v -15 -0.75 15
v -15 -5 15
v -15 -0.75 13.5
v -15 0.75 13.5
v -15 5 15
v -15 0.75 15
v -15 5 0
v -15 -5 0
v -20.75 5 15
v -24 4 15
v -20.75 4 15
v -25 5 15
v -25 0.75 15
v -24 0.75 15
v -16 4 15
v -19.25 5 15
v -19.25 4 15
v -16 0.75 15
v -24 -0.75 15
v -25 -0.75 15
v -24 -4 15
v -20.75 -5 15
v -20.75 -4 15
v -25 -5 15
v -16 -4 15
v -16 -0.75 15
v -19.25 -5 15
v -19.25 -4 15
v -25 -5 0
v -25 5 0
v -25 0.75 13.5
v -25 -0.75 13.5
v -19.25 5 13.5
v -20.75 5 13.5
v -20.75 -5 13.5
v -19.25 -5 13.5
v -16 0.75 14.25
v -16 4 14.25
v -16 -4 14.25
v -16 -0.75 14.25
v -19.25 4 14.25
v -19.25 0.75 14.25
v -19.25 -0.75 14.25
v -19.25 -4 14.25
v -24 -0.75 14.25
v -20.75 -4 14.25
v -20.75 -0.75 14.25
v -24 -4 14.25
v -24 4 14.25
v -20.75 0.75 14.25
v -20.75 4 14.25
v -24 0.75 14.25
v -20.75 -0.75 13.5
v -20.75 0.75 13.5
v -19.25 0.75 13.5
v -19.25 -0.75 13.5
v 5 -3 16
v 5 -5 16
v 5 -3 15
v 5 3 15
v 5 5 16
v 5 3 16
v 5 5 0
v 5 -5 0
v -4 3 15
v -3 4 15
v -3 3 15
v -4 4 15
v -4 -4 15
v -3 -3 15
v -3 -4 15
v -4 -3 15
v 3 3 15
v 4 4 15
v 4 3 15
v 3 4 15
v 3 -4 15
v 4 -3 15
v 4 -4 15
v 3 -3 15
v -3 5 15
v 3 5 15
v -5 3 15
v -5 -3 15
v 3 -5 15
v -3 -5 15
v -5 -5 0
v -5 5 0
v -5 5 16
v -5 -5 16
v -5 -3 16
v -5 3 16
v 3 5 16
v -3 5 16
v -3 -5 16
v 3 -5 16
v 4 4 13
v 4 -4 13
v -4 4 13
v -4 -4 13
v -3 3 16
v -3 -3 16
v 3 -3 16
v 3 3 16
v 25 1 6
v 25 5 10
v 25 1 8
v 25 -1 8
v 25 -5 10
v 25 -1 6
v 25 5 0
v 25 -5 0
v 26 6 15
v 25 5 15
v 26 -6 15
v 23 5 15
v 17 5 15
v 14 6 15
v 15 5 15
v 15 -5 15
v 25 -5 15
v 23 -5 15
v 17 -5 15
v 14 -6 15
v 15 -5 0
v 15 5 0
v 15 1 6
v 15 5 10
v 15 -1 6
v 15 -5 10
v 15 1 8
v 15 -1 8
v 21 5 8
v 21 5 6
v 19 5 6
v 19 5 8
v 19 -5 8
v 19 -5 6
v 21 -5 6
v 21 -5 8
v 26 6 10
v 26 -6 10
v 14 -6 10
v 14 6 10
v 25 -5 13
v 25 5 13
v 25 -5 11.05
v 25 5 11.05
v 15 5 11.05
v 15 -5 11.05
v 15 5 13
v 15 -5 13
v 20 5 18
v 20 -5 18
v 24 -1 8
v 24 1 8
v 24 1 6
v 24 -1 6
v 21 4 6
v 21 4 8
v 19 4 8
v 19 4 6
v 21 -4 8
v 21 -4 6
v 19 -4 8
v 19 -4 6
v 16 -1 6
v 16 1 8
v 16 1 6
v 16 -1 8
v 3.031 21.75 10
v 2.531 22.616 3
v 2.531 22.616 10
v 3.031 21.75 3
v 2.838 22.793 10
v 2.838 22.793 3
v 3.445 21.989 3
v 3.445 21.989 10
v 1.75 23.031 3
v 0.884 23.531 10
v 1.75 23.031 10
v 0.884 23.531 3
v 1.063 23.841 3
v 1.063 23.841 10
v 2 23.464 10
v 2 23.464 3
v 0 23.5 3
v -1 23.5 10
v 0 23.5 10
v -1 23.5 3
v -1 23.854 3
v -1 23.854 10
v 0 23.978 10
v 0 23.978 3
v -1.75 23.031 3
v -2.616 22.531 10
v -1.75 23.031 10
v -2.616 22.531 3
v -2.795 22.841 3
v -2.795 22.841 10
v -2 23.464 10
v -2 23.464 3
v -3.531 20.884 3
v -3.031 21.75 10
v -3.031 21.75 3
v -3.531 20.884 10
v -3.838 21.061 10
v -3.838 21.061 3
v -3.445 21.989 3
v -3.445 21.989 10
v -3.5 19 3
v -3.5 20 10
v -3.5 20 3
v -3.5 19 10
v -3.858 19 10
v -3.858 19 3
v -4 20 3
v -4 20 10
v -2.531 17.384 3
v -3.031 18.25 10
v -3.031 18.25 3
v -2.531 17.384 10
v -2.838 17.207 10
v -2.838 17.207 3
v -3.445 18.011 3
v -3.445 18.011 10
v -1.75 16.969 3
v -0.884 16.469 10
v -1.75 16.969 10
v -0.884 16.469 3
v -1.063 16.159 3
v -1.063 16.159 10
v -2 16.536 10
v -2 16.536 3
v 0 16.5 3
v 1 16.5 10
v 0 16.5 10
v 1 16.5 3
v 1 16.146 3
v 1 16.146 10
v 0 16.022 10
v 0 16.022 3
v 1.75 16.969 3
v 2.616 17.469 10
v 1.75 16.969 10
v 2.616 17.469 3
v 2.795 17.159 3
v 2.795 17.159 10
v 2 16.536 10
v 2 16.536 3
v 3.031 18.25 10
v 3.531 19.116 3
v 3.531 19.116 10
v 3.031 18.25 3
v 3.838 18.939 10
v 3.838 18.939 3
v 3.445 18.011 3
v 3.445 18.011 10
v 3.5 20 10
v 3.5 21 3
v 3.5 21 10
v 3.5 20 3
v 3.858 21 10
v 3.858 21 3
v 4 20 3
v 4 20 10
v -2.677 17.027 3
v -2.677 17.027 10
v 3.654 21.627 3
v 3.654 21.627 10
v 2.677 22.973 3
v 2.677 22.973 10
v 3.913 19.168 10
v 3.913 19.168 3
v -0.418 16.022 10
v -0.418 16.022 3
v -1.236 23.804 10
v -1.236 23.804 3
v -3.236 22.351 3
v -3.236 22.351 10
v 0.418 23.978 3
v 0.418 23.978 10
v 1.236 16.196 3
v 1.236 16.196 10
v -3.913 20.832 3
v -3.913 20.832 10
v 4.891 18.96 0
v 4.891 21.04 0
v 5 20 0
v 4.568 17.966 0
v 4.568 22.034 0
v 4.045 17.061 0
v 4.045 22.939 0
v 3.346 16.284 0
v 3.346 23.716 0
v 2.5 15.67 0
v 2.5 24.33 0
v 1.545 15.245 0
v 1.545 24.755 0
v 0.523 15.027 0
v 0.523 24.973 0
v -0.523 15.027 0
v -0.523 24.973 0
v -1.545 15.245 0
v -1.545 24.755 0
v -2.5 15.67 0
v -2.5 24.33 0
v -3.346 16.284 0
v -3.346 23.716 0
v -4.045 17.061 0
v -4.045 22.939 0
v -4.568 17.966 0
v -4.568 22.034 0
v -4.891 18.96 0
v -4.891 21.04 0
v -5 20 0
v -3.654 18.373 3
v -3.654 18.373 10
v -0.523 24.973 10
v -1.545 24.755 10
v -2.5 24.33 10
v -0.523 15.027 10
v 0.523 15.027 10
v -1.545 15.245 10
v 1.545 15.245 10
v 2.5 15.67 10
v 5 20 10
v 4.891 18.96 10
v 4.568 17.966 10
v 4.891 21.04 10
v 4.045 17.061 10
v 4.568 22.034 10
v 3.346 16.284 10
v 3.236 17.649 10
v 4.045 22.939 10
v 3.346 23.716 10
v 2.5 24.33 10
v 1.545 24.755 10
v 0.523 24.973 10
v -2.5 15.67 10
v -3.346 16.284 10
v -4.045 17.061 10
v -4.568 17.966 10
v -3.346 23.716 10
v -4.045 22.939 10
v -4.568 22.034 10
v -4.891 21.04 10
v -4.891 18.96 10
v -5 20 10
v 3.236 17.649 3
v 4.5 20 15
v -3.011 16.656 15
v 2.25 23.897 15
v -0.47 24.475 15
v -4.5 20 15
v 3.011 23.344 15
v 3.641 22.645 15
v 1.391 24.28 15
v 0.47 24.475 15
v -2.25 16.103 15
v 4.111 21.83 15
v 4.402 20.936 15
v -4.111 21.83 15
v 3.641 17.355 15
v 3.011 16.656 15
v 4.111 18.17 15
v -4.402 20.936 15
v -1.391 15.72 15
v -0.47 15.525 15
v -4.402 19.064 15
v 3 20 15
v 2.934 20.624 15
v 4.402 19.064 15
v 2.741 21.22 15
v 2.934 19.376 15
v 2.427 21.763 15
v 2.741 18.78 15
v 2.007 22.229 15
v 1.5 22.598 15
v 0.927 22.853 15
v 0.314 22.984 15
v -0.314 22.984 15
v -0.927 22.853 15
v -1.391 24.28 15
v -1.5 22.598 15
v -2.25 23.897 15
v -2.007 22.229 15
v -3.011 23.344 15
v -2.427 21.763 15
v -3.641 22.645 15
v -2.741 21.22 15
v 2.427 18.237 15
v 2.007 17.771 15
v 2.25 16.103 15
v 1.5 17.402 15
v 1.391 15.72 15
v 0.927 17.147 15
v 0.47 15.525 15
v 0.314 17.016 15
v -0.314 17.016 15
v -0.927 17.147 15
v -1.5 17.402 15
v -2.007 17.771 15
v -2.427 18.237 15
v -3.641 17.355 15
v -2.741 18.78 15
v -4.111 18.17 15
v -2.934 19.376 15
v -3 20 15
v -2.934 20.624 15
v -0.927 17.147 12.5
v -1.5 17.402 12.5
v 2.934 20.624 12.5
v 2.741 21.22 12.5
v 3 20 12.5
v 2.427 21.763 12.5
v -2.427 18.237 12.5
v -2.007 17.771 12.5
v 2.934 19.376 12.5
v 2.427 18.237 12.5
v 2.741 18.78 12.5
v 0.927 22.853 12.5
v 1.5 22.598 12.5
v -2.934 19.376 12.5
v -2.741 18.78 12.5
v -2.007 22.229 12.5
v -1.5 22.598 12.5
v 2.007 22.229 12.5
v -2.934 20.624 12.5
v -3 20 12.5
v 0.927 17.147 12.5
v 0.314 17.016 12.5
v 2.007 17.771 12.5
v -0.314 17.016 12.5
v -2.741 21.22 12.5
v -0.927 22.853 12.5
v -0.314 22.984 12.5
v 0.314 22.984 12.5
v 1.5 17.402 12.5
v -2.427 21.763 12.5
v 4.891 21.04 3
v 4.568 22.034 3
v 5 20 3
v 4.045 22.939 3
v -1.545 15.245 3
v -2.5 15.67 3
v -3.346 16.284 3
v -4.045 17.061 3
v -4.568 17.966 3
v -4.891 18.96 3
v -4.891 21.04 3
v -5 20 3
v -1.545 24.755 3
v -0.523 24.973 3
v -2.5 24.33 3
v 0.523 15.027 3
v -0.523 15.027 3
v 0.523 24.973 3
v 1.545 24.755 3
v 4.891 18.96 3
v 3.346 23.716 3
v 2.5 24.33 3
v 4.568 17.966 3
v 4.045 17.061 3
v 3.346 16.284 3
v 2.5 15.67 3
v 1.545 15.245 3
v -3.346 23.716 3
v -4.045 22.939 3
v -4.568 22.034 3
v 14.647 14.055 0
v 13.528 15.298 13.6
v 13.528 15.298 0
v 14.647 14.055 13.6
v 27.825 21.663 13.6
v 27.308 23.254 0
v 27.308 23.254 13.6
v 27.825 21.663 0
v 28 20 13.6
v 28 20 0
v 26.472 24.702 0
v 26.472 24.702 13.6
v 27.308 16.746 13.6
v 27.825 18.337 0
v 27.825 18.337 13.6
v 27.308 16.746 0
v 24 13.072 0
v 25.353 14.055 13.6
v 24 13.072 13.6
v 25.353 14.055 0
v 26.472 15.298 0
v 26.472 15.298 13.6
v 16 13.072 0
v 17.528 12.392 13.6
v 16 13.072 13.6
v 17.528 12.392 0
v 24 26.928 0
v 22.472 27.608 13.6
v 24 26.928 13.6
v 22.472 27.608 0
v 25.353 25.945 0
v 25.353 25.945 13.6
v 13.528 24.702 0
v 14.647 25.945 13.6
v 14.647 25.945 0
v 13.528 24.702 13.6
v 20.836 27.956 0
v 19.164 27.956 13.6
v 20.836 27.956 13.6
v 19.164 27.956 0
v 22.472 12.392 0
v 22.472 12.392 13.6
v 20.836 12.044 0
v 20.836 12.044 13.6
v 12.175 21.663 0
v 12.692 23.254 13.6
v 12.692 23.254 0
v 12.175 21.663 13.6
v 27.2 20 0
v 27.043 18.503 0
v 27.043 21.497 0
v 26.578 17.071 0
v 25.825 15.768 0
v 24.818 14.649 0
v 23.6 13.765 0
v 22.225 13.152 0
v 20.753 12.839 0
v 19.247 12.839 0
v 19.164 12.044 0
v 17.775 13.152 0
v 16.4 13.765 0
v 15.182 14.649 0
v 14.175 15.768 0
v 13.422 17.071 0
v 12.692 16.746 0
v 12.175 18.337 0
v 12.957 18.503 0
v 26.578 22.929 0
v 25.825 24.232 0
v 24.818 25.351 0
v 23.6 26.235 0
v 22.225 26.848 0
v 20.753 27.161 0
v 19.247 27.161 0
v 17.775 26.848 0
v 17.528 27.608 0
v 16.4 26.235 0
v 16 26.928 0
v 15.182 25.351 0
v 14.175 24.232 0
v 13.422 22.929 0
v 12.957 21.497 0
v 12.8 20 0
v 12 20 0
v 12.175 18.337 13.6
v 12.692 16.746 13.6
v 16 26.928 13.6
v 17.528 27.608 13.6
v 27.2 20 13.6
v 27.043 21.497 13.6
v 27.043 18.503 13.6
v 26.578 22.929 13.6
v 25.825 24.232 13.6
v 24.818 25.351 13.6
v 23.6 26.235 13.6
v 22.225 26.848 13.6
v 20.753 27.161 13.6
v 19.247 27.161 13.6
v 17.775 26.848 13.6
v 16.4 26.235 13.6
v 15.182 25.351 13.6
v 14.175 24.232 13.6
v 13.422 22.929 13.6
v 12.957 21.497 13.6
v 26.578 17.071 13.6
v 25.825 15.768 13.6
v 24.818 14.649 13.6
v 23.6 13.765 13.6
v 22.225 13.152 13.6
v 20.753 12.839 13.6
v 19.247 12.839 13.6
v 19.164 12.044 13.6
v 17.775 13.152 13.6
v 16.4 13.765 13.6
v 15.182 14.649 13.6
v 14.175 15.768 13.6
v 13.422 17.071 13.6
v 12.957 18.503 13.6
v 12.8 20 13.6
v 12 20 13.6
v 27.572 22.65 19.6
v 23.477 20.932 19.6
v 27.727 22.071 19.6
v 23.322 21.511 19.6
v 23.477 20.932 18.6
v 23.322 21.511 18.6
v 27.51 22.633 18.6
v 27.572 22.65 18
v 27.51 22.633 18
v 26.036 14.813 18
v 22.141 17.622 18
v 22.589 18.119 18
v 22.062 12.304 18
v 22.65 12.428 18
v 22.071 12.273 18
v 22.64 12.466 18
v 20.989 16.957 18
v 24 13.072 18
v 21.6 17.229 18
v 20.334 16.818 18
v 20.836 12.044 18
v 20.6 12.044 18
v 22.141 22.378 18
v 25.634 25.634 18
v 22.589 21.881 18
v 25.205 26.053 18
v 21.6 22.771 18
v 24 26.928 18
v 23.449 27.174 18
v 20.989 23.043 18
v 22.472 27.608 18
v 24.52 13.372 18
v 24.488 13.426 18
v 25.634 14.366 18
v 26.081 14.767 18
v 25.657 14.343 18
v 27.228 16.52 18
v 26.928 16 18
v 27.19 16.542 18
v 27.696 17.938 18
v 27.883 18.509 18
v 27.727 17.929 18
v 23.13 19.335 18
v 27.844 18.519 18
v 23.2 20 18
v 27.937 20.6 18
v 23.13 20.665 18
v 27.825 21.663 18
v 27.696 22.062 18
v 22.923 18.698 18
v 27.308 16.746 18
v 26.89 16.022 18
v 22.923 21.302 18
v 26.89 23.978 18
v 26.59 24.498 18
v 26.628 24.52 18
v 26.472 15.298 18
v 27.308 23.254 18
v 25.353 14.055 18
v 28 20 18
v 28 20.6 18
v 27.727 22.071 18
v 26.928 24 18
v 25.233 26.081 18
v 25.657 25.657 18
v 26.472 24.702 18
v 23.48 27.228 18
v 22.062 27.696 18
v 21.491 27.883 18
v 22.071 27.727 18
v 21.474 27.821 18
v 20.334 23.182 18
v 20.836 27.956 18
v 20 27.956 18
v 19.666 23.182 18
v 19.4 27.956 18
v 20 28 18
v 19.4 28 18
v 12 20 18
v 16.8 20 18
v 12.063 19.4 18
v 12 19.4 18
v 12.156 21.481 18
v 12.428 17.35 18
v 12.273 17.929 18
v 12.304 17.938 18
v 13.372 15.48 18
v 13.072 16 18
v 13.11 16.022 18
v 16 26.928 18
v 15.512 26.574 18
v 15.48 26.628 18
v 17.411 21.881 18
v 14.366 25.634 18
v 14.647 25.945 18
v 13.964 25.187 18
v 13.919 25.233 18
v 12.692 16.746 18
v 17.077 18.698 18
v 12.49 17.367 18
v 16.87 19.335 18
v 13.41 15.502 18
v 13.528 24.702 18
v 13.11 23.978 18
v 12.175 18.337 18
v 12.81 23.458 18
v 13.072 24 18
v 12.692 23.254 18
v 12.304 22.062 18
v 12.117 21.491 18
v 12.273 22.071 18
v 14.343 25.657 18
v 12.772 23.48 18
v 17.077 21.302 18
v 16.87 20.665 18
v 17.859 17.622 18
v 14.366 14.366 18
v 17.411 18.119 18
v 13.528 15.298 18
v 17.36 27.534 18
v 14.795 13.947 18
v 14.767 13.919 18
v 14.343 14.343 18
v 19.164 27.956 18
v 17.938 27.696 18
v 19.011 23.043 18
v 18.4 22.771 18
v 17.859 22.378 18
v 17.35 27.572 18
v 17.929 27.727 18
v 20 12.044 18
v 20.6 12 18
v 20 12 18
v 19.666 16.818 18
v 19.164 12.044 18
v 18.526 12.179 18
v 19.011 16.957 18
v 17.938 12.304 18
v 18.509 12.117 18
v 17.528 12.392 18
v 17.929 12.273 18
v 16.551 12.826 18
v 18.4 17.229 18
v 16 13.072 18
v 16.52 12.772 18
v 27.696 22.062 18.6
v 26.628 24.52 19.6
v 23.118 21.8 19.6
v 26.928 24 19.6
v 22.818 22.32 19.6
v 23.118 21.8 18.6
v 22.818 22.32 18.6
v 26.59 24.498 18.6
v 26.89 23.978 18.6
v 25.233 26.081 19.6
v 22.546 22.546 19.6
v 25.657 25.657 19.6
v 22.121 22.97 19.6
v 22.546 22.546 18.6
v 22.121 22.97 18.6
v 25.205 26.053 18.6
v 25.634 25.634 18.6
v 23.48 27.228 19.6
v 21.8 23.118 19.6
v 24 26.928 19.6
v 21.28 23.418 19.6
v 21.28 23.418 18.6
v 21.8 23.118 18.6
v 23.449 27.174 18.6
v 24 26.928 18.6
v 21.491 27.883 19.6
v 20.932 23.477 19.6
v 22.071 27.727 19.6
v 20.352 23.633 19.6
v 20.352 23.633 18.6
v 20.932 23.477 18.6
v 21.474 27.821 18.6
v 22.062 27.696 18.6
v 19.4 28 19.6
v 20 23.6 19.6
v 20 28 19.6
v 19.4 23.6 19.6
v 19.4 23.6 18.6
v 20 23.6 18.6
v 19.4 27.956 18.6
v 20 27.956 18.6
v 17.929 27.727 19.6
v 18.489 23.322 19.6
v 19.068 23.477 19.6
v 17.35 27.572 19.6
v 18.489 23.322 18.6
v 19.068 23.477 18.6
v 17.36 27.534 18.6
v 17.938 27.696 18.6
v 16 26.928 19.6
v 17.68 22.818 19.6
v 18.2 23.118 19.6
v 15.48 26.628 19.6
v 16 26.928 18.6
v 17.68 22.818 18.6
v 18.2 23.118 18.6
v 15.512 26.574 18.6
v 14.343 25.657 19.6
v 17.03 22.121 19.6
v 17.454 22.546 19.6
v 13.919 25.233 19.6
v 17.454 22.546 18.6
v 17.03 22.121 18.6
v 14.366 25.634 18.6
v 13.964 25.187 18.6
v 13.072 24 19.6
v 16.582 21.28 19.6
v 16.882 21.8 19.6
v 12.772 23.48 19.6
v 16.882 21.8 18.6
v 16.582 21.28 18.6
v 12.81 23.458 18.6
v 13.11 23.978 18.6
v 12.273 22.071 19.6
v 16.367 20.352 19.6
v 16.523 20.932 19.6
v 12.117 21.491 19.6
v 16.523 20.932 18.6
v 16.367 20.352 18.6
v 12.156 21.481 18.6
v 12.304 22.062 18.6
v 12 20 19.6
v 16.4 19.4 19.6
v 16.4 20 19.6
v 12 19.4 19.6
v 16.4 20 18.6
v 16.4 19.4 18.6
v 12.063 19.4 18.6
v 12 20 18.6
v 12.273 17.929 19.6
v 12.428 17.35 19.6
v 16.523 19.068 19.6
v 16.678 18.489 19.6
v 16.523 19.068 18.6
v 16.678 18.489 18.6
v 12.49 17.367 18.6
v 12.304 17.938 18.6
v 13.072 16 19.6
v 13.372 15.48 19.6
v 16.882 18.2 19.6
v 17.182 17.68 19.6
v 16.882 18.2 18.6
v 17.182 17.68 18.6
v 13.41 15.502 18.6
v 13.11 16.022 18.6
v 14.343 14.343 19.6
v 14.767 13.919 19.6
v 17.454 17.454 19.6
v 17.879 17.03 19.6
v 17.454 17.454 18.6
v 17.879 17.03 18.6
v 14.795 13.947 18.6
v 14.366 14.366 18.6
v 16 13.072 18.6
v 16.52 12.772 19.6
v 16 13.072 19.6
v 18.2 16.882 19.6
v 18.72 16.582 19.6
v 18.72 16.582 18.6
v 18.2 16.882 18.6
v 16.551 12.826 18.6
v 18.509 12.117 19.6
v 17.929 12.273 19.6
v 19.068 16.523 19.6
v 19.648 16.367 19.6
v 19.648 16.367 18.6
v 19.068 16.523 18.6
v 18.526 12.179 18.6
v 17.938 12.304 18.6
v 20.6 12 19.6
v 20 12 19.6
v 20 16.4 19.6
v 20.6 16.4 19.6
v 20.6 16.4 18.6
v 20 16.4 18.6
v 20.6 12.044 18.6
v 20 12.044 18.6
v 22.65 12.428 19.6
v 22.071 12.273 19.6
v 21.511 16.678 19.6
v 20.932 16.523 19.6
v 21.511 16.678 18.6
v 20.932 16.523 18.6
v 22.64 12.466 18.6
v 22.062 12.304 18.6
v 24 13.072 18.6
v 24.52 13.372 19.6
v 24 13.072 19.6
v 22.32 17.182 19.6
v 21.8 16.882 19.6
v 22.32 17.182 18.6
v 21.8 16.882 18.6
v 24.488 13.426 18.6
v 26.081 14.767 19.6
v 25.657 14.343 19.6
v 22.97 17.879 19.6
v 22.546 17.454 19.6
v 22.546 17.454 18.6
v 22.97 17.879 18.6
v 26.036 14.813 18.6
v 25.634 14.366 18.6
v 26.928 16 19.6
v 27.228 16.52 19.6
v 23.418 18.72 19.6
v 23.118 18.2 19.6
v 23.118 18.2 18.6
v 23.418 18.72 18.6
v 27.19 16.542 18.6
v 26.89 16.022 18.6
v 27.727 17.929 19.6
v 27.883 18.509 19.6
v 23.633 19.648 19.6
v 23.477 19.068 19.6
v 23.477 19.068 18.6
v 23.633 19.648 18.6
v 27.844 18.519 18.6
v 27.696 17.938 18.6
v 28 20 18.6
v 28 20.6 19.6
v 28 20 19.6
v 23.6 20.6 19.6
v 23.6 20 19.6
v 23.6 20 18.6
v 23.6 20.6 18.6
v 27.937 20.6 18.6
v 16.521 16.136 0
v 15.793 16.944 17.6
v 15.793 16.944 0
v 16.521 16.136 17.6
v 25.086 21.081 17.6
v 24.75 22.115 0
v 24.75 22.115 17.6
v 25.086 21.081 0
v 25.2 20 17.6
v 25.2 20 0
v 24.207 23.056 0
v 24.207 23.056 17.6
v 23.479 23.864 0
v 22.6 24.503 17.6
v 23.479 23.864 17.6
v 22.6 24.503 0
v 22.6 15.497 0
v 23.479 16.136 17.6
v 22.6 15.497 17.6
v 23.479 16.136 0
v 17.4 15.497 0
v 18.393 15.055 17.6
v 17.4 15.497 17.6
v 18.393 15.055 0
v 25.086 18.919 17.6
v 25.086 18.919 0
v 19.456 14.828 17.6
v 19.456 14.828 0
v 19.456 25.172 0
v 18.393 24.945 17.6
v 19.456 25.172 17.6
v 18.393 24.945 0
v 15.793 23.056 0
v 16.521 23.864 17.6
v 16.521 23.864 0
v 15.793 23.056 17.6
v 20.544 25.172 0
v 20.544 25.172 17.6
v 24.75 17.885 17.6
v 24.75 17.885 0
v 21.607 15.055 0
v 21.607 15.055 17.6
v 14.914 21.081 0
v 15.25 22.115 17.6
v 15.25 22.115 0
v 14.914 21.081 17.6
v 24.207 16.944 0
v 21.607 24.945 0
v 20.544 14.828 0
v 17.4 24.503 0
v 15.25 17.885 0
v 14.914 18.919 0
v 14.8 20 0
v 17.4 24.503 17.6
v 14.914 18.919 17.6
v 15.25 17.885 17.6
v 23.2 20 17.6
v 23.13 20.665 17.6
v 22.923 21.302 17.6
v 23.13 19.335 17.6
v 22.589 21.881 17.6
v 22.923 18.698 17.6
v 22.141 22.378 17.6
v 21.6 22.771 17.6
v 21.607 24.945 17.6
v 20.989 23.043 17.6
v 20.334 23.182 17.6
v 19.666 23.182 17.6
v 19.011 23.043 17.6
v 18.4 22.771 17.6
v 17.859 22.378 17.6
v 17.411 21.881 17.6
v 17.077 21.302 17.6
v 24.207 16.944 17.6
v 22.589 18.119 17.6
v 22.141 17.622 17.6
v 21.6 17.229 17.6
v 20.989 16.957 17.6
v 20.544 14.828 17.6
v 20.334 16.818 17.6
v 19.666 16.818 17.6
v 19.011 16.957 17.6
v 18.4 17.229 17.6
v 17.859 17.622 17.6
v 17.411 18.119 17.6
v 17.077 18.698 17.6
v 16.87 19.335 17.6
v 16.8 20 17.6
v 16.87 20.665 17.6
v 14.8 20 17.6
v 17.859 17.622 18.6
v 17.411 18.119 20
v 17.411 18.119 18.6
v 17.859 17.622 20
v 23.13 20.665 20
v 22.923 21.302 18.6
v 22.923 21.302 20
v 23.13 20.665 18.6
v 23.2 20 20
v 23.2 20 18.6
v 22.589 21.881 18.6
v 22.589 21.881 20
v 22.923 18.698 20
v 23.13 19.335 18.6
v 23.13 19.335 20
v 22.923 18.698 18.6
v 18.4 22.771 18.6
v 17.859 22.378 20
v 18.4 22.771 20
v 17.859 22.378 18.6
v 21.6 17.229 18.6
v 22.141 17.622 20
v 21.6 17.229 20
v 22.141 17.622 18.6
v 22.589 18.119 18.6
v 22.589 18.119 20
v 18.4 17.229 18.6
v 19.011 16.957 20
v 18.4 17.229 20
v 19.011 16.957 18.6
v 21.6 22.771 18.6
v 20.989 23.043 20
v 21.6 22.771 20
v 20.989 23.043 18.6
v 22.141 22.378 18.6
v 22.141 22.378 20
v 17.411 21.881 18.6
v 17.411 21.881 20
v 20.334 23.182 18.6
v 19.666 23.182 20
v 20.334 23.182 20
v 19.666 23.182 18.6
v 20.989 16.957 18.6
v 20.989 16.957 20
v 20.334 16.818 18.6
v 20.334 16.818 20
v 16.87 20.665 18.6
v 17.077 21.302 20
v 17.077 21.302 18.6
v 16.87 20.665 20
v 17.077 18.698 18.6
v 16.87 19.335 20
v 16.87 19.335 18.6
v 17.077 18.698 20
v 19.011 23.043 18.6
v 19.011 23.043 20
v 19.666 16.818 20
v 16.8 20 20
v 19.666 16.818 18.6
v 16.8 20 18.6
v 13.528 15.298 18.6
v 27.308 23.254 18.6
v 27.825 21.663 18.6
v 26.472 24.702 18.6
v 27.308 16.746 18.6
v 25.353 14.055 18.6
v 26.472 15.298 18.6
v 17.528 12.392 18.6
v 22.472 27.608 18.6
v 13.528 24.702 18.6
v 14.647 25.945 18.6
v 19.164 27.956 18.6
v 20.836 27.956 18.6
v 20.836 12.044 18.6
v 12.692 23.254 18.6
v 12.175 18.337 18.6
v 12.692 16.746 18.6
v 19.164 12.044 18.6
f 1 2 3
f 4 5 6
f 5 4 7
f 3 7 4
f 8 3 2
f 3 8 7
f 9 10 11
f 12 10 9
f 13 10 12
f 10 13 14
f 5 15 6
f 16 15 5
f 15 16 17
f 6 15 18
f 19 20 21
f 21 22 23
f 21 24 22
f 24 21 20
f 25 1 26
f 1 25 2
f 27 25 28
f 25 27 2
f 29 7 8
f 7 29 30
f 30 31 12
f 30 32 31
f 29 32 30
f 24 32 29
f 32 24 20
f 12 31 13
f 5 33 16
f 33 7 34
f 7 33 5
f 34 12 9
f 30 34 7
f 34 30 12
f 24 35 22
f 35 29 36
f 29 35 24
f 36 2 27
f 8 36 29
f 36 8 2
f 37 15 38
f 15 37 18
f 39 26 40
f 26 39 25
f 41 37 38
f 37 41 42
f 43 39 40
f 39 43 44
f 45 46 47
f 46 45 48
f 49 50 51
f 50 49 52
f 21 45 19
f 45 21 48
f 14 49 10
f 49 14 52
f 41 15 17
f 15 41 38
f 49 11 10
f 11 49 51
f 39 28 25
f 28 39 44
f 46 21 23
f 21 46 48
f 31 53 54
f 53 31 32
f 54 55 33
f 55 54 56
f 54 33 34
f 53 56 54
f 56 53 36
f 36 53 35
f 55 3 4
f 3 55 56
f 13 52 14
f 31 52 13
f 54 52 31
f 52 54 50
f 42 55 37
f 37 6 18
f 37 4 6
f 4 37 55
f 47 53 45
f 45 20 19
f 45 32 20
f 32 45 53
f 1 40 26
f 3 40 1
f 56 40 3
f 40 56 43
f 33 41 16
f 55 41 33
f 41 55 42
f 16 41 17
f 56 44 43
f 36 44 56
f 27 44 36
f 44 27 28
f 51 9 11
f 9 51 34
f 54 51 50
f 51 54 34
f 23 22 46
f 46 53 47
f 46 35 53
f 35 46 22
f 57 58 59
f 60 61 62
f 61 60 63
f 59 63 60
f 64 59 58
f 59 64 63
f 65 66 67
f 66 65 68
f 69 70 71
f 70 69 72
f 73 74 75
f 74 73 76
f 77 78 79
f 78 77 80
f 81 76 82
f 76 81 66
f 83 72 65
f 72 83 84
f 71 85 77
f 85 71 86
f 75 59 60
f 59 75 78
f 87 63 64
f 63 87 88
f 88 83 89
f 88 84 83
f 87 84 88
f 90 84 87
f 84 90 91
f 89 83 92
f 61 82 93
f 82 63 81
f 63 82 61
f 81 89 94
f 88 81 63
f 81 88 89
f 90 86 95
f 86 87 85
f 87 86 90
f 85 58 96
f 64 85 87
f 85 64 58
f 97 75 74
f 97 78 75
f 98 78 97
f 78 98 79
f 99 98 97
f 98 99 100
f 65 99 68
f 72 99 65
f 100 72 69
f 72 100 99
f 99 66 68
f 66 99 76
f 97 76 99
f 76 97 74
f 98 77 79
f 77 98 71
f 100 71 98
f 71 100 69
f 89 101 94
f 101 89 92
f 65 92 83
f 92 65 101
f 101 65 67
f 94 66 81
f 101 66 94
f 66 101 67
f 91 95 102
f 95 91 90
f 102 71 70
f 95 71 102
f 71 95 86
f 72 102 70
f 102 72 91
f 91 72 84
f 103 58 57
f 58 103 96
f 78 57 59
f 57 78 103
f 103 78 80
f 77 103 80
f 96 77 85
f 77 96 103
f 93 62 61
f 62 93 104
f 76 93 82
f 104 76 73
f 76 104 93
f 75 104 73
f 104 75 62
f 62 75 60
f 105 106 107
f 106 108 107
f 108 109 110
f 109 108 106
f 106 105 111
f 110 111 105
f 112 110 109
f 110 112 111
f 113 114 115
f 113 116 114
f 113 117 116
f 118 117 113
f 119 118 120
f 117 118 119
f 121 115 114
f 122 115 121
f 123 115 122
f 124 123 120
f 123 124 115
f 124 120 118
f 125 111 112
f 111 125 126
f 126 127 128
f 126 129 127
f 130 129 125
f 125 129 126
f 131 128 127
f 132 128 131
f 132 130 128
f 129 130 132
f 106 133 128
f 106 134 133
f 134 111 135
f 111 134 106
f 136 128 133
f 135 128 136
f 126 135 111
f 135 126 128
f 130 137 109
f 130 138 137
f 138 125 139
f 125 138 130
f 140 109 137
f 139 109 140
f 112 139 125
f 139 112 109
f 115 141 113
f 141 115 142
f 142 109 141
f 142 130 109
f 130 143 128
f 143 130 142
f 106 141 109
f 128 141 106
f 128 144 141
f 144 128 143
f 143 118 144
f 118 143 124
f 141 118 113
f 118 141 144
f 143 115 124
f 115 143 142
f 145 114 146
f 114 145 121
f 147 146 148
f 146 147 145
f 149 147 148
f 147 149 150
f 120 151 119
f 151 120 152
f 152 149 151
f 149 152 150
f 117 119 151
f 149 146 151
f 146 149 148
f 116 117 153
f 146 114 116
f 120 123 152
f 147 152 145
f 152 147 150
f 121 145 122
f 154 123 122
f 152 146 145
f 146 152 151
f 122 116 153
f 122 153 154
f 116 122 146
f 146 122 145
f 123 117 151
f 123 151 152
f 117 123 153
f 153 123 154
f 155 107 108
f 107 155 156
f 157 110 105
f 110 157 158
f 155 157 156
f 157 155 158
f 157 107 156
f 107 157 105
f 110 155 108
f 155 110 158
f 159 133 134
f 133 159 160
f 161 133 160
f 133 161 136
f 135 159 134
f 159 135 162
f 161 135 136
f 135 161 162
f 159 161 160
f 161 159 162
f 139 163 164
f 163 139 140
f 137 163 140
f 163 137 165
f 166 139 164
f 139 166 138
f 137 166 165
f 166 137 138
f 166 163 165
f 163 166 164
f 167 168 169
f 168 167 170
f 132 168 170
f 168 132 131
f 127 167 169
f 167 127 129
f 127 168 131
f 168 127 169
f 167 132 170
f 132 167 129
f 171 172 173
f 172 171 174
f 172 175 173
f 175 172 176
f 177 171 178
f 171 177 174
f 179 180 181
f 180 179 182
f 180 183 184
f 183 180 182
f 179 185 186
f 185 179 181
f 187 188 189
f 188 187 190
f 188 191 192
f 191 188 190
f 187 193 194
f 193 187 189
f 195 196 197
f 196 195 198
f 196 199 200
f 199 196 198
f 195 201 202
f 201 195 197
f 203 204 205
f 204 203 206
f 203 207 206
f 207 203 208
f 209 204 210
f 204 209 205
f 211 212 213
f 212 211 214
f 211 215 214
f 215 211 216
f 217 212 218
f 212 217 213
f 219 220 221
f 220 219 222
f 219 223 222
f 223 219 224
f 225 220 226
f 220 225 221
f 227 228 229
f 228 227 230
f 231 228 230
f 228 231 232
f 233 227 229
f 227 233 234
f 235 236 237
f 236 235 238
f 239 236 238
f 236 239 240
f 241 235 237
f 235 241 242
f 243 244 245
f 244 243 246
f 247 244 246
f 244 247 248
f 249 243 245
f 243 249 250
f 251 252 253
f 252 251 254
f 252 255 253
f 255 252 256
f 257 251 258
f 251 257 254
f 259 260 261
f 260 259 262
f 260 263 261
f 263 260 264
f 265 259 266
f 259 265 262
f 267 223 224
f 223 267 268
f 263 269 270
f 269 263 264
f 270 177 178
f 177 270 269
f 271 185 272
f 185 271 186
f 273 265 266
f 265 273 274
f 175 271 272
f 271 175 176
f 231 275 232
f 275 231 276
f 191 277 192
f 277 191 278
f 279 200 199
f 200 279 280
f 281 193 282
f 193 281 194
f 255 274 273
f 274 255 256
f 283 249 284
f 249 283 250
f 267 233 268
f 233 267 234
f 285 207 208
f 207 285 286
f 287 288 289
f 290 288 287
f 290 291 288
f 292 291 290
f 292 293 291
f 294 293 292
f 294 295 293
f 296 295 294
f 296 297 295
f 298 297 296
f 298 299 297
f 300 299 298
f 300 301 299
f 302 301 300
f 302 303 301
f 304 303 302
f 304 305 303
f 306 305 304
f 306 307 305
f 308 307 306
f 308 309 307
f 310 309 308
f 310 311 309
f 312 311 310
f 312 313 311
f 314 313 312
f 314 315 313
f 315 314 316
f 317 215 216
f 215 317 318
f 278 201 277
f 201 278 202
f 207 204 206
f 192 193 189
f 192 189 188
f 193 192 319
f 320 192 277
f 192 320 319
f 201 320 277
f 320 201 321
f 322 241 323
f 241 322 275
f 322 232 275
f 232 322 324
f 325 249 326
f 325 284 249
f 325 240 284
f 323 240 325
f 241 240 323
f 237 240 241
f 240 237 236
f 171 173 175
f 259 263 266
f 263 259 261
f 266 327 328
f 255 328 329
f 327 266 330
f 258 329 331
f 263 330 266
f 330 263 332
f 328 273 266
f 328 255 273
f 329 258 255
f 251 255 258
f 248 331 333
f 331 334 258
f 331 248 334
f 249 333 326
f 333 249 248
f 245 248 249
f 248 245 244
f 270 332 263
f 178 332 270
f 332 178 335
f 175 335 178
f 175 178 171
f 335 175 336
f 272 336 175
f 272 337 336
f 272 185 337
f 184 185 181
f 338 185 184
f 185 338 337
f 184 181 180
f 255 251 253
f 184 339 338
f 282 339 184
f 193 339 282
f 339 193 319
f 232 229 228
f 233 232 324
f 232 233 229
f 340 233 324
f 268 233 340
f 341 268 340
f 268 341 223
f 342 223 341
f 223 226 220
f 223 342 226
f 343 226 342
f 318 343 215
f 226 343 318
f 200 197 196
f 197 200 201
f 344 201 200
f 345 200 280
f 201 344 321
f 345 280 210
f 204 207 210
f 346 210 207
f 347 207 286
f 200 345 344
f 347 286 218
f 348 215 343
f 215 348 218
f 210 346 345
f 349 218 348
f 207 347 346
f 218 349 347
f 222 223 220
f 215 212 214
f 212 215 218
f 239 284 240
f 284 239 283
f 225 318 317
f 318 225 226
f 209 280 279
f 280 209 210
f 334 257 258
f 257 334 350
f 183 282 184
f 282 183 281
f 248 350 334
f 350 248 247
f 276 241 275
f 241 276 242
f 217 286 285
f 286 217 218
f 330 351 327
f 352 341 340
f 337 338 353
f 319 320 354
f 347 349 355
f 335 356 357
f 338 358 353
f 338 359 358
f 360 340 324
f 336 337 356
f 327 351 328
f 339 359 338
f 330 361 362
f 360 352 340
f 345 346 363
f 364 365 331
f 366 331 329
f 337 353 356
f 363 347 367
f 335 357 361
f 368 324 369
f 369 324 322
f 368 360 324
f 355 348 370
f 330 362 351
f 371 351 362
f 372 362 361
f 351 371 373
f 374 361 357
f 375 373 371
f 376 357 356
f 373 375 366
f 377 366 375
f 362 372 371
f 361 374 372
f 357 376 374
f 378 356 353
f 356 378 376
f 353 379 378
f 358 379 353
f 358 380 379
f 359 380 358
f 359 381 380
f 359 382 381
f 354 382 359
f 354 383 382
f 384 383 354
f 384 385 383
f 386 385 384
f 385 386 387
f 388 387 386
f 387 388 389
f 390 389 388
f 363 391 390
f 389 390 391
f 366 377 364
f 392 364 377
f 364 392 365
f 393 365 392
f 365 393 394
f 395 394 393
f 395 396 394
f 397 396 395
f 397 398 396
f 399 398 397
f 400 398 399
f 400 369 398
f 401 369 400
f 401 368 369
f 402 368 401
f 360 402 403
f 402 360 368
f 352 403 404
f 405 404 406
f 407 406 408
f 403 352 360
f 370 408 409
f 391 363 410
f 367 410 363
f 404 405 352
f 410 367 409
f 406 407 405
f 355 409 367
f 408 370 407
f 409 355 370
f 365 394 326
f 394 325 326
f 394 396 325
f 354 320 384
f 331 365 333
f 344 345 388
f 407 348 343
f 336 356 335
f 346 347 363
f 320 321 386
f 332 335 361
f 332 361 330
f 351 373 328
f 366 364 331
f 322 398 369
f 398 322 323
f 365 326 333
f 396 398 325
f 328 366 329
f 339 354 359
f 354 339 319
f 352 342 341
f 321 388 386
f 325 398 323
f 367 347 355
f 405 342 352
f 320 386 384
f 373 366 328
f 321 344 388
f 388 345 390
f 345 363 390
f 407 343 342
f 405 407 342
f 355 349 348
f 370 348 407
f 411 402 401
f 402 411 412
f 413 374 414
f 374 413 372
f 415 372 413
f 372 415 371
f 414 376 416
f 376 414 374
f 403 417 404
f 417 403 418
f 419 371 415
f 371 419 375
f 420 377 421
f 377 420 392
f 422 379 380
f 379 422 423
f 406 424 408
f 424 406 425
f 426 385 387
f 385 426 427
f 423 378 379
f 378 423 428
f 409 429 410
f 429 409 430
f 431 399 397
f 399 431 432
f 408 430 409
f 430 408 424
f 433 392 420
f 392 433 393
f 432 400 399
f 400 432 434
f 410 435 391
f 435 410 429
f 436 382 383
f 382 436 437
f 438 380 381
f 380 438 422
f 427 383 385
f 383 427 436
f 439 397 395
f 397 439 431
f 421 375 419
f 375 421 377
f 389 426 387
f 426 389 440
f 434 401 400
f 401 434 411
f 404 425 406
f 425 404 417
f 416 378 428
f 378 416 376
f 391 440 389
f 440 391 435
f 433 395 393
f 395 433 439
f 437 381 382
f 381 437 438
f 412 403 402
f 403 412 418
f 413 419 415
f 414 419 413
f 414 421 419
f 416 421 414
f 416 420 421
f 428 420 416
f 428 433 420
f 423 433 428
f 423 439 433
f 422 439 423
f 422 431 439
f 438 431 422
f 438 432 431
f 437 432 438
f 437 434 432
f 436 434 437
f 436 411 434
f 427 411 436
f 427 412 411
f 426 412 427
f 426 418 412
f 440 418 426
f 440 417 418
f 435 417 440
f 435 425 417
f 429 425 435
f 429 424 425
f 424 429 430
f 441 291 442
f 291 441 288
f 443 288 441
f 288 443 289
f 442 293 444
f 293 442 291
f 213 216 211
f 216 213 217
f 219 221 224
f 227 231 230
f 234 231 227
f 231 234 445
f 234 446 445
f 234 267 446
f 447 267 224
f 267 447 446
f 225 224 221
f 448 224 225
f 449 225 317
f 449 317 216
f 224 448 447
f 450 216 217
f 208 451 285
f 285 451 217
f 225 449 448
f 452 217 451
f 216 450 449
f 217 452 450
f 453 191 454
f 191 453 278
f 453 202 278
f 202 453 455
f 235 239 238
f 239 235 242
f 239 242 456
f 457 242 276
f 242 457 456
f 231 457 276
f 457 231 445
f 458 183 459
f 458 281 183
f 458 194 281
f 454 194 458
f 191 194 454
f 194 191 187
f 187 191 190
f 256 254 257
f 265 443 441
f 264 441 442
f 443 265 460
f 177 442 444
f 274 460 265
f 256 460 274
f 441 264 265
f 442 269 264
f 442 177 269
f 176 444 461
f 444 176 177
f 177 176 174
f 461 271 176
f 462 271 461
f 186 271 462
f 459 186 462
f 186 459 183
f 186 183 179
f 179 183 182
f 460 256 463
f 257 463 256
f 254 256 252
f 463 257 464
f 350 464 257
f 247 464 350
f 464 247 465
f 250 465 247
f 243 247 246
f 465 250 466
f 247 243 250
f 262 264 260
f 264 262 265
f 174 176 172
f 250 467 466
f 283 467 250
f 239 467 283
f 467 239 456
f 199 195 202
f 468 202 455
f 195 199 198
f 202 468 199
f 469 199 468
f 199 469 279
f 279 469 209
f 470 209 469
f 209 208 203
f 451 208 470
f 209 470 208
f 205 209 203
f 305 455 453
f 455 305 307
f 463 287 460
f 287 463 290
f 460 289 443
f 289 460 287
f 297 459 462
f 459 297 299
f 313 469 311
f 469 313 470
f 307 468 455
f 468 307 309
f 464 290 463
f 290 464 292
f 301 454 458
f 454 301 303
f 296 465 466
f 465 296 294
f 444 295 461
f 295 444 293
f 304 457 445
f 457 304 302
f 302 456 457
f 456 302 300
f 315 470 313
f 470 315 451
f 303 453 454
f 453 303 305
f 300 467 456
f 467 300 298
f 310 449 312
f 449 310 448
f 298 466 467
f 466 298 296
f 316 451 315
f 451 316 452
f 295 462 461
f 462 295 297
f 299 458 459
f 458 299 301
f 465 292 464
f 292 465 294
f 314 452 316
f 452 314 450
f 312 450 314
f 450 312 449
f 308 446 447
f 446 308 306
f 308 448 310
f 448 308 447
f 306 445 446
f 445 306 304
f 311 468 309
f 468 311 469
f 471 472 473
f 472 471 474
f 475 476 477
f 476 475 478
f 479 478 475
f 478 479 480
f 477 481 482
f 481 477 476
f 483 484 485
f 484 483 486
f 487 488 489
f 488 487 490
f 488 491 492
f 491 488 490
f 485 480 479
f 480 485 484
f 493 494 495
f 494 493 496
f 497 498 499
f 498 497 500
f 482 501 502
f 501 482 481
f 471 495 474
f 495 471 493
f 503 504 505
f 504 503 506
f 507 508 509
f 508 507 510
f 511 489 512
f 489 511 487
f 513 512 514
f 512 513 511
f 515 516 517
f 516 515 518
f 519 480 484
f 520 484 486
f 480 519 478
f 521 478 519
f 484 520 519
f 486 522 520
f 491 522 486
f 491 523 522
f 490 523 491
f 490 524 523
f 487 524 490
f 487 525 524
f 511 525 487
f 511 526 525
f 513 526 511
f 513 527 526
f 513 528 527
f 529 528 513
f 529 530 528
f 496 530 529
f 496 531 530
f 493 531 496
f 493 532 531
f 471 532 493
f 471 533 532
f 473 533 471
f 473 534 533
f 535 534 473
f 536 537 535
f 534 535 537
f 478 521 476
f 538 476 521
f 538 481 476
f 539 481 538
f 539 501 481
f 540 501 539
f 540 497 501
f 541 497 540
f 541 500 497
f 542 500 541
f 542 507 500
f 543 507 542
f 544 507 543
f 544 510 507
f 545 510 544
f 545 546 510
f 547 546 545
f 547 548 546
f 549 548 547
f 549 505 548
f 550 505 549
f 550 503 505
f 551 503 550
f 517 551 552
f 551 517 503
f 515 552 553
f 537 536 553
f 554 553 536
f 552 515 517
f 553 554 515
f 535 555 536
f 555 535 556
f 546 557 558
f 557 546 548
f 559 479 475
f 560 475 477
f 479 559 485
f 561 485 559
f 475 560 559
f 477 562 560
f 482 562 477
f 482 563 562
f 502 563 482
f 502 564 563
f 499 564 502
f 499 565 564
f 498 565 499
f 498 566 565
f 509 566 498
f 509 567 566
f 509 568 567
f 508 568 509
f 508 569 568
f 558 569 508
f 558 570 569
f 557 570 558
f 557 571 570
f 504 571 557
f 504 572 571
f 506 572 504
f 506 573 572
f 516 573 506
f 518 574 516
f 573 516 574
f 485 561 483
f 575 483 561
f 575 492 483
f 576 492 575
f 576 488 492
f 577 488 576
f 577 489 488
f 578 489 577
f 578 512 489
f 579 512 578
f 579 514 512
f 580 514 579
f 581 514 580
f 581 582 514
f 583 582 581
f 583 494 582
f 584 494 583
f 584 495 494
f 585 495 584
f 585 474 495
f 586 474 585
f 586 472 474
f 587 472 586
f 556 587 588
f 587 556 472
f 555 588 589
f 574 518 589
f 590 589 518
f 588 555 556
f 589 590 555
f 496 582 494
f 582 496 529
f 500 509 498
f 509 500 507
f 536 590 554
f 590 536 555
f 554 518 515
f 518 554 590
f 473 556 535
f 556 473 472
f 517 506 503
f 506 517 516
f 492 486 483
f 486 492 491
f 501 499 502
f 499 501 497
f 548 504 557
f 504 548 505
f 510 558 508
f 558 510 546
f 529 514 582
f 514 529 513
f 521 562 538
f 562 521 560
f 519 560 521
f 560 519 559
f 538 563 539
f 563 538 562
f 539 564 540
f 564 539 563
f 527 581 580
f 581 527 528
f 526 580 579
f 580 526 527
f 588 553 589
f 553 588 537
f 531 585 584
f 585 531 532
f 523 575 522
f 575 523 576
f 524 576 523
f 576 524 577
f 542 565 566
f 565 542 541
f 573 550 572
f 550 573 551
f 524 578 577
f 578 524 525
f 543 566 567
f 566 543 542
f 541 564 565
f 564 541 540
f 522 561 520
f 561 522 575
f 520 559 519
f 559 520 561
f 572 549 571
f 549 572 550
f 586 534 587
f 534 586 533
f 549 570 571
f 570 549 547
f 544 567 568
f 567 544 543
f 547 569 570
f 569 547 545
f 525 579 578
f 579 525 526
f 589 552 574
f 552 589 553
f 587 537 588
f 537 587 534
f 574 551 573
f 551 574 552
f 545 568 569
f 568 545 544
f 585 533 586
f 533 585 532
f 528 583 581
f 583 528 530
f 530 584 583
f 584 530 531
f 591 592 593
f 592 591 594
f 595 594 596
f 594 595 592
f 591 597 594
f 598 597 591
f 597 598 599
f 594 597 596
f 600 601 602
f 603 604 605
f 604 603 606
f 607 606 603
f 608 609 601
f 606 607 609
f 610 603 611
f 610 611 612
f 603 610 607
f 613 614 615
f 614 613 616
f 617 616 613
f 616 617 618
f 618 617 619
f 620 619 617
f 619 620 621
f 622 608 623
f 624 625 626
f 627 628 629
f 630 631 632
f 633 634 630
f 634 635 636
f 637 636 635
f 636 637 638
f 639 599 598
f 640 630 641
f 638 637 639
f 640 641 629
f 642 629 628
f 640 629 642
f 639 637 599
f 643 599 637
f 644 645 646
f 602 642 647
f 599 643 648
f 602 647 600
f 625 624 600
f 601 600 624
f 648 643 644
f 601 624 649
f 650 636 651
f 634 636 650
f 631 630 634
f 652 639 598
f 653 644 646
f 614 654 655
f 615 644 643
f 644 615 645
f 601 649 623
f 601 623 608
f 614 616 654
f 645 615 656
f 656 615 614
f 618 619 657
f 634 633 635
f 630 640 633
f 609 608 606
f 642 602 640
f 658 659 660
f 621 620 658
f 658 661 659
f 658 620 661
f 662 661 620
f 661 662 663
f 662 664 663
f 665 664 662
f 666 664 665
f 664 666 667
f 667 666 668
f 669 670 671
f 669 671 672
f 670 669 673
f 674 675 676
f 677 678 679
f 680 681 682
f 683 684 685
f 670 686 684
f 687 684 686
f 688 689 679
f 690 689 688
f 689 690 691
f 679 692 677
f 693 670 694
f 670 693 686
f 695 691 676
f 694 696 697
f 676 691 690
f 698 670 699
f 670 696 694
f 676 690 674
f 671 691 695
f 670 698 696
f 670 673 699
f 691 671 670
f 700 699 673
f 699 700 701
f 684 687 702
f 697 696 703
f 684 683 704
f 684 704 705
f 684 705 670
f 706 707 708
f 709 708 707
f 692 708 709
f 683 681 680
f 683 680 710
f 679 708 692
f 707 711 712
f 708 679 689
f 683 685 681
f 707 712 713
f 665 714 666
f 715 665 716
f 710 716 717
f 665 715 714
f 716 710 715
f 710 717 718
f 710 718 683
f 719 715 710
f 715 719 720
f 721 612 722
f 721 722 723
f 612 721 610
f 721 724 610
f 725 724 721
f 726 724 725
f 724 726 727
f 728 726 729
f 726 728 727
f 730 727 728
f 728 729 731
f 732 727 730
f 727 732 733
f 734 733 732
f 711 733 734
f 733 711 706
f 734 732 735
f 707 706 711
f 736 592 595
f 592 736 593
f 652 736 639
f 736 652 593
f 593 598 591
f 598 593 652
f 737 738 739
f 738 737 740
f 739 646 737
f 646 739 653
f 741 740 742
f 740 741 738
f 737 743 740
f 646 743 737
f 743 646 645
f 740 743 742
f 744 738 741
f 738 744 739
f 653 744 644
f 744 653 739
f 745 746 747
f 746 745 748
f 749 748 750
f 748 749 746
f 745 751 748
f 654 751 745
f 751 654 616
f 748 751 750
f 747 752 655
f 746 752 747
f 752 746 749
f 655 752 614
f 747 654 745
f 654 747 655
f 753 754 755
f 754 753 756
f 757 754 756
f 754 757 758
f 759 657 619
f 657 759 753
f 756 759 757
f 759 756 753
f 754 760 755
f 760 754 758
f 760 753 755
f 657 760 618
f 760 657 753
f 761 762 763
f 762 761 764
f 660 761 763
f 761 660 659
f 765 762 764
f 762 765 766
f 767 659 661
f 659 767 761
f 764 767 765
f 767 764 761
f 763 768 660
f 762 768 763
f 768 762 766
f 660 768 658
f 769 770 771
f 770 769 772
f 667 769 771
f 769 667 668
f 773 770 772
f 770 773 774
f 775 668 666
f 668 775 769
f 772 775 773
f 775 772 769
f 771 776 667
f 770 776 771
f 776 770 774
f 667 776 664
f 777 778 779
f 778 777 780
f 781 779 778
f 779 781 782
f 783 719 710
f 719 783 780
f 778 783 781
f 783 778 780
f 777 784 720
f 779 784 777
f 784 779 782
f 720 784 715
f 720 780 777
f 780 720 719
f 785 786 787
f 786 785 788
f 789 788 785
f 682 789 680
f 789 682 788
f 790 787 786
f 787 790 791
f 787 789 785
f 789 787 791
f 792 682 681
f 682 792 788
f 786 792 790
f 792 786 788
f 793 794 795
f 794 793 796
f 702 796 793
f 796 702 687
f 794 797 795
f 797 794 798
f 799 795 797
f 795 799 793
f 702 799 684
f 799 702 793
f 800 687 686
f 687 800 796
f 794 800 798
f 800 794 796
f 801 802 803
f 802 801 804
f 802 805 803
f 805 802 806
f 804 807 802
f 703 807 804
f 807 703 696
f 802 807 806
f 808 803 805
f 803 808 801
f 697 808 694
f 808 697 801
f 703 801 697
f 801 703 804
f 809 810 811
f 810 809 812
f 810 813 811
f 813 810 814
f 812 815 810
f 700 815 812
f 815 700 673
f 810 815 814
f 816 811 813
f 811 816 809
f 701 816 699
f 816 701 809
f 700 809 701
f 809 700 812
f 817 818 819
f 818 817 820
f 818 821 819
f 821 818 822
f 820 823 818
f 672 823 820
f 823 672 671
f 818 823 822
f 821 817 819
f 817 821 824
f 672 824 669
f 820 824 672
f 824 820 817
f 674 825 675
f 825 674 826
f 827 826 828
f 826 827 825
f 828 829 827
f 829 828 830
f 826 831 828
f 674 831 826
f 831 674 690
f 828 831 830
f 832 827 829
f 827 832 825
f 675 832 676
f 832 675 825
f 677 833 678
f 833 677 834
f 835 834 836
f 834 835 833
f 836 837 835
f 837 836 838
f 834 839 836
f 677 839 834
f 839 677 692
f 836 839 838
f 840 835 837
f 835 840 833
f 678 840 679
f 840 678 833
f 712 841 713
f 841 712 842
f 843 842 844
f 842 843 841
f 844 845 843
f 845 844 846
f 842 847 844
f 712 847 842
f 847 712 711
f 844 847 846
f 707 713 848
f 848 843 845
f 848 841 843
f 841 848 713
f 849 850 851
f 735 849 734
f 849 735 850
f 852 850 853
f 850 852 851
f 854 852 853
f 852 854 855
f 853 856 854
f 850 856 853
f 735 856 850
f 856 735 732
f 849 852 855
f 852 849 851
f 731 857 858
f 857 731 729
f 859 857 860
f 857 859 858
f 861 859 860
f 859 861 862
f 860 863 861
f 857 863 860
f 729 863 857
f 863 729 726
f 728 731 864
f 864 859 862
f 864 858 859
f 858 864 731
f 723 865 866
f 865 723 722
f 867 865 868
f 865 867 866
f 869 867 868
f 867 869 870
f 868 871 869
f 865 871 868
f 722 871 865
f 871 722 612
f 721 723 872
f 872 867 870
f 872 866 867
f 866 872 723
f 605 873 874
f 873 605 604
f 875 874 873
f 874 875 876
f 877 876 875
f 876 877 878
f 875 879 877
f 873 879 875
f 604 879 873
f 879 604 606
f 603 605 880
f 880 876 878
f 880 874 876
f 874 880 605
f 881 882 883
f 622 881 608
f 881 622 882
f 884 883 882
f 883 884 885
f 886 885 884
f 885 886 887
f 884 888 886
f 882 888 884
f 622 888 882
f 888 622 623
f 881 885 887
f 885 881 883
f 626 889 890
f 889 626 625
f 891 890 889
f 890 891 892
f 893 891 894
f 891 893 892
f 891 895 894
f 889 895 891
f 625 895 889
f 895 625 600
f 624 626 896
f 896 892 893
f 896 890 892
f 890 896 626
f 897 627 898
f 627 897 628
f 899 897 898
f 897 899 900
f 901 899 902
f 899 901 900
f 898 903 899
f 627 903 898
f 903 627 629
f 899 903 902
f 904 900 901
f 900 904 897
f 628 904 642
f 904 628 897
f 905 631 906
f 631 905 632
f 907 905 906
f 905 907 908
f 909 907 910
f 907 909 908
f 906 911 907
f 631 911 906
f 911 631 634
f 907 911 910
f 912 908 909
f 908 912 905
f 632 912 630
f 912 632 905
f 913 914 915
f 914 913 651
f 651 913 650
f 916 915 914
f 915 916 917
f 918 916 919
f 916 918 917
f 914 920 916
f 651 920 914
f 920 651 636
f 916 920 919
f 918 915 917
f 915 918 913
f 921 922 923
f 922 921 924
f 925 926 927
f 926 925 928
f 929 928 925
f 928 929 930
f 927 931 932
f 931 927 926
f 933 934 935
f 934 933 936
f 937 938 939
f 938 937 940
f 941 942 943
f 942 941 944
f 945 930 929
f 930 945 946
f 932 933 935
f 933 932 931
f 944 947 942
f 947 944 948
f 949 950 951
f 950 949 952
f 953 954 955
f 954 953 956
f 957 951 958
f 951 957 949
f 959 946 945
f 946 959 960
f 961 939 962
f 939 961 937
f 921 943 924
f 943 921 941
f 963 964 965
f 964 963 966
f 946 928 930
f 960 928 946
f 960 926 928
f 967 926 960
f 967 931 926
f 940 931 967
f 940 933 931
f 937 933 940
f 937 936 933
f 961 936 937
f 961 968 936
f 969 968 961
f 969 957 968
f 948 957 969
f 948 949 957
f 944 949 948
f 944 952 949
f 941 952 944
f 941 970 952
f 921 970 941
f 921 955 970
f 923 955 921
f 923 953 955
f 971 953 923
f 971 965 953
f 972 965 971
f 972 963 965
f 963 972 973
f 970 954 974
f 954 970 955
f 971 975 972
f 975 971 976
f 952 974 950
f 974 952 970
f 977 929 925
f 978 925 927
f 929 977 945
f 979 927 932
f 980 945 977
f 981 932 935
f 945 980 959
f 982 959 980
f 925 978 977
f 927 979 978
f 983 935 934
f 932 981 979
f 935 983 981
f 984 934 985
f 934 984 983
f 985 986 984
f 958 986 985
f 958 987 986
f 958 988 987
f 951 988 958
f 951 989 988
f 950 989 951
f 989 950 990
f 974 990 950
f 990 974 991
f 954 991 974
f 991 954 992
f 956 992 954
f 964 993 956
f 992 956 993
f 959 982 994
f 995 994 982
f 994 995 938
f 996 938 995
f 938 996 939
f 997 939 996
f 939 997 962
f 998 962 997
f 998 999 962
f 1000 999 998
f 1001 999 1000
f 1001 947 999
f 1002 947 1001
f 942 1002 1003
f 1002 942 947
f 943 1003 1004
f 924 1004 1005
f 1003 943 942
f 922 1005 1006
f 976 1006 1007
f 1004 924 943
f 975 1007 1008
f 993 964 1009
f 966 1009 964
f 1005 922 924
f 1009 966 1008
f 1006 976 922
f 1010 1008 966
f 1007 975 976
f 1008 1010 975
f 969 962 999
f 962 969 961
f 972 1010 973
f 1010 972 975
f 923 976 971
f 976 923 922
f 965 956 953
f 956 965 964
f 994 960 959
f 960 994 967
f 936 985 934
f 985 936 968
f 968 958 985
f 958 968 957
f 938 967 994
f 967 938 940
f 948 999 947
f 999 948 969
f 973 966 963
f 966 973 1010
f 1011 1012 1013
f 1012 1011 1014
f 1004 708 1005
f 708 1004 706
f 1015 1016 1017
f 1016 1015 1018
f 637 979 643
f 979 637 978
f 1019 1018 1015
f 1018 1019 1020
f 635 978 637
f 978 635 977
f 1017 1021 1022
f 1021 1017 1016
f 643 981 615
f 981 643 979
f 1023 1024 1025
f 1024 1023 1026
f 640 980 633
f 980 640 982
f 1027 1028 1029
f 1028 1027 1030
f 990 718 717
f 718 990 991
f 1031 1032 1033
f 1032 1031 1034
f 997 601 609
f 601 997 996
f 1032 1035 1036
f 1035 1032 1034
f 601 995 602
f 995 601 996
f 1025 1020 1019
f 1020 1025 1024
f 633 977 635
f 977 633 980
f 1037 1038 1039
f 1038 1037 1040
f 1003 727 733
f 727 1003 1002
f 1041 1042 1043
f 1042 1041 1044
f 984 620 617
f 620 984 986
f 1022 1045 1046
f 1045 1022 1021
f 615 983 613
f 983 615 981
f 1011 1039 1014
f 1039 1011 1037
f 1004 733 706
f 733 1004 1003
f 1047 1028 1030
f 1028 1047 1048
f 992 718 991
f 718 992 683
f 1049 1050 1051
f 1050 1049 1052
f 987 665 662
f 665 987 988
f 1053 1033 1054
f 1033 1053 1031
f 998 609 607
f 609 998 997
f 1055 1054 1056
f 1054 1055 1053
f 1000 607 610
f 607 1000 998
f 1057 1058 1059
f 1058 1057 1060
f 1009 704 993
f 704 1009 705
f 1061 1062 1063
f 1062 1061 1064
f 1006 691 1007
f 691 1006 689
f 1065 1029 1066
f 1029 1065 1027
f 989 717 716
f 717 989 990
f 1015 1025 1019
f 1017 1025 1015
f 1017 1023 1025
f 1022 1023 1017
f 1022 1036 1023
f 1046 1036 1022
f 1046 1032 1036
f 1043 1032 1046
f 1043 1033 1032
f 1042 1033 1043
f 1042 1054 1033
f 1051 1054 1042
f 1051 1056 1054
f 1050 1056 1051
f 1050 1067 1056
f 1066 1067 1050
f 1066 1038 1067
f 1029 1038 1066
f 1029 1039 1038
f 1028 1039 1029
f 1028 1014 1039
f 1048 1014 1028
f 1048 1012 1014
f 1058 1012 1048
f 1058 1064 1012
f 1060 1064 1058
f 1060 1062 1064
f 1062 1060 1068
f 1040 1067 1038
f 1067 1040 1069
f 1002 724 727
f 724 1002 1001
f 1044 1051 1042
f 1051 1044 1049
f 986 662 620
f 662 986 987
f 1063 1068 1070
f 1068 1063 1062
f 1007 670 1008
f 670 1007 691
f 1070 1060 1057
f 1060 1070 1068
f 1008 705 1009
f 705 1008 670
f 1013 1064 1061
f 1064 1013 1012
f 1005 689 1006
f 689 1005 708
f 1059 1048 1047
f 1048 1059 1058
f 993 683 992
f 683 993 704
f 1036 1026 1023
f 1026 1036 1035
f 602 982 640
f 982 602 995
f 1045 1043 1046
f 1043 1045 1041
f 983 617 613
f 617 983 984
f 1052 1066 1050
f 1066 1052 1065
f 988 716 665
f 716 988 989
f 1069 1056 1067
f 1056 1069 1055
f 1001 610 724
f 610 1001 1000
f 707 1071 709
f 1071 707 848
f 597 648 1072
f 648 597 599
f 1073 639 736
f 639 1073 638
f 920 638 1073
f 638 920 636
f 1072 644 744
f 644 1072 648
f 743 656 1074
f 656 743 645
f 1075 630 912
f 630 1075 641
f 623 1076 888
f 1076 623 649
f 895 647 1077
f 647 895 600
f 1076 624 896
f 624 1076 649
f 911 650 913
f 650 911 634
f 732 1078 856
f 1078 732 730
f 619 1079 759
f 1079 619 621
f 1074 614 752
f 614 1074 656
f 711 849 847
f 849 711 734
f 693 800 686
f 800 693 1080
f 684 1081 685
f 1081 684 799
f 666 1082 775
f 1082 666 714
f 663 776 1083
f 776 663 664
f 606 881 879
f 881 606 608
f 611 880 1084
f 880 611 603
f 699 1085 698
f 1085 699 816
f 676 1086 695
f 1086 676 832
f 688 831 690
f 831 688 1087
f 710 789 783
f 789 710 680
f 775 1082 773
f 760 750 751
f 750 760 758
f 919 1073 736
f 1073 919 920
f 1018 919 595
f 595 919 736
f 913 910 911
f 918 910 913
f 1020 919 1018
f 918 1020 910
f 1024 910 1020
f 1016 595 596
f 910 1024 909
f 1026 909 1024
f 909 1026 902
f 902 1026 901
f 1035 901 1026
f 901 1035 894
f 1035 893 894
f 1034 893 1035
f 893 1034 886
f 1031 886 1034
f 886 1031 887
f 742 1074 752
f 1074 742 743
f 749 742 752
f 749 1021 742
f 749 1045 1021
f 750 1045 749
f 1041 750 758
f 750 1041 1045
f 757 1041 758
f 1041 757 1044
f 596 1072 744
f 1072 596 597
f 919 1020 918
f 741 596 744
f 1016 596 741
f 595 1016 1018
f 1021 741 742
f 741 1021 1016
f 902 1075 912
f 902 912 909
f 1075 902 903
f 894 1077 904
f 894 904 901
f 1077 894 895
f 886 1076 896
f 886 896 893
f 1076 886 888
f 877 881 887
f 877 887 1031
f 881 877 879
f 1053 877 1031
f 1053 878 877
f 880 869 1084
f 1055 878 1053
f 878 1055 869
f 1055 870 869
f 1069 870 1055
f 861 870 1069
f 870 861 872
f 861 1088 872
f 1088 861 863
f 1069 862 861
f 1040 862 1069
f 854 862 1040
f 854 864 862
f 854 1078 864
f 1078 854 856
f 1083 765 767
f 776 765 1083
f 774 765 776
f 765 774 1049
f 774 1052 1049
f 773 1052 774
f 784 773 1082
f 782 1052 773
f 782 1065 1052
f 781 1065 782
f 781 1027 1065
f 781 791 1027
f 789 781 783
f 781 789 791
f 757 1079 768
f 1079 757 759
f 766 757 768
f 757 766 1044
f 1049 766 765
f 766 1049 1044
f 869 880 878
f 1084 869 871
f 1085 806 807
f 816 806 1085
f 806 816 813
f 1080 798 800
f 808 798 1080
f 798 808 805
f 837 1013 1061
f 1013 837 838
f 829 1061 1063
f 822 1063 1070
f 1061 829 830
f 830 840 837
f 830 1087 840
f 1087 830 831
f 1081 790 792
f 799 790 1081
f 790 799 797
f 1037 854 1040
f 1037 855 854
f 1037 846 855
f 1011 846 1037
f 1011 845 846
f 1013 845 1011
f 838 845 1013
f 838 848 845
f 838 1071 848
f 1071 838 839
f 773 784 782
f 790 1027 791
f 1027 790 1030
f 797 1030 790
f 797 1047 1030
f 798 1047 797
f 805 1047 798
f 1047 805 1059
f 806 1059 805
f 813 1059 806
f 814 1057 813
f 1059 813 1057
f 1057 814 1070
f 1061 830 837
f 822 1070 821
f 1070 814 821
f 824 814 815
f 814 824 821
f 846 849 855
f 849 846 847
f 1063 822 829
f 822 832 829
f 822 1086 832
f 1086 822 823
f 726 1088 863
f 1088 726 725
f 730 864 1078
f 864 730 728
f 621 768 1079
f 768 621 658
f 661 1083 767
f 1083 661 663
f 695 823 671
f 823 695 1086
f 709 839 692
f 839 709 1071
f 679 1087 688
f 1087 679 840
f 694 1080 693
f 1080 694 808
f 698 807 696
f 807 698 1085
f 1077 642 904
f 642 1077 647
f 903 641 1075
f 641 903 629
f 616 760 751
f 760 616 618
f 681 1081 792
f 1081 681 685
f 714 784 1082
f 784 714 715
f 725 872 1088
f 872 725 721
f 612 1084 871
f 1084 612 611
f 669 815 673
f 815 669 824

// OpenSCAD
// tower with cross roof
module tower_s0(blen, height){
	difference(){
		translate([0, 0, height/2]) cube([blen, blen, height], center=true);
		translate([0, 0, height]) cube([blen*0.8, blen*0.8, height*0.1], center=true);
		translate([0, 0, height]) cube([blen*1.1, blen*0.15, height*0.2], center=true);
		translate([0, 0, height]) cube([blen*0.15, blen*1.1, height*0.2], center=true);
	}
}

// tower with triangular roof
module tower_s1(blen, height){
	difference(){
	union(){
	difference(){
		union(){
			translate([0, 0, height/2]) 
			cube([blen, blen, height], center=true);
			translate([0, 0, height-blen*0.25]) 
			cube([blen*1.2, blen*1.2, blen*0.5], center=true);
		}
		translate([0, 0, height-blen*0.195]) 
		cube([blen, blen, blen*0.4], center=true);
	}
	translate([0, 0, height-blen*0.2]) rotate(a=[90, 0, 0]) 
	linear_extrude(height = blen, center = true)
	polygon(points=[[-blen/2, 0], [blen/2, 0], [0, blen/2]]);
	}
	translate([blen/2, 0, height-blen*0.8])
	cube([blen*0.2, blen*0.2, blen*0.2], center=true);
	translate([0, blen/2, height-blen*0.8])
	cube([blen*0.2, blen*0.2, blen*0.2], center=true);
	translate([0, -blen/2, height-blen*0.8])
	cube([blen*0.2, blen*0.2, blen*0.2], center=true);
	translate([-blen/2, 0, height-blen*0.8])
	cube([blen*0.2, blen*0.2, blen*0.2], center=true);
	}
}

// basic squarish tower
module tower_s2(len, h){
	difference(){
	translate([0, 0, h/2])
	cube([len, len, h], center=true);
	translate([0, 0, h])
	cube([len*0.8, len*0.8, len*0.4], center=true);
	}
	for(i=[1:4]){
		rotate([0, 0, 90*i])
		translate([len*0.3, len*0.3, h])
		cube([len*0.2, len*0.2, len*0.1]);
	}
}

module tower_r0(r, h){
	union(){
	cylinder(r=r, h=h*0.2, $fn=30);
	difference(){
	cylinder(r=r*0.8, h=h-r, $fn=30);
	translate([0, 0, h*0.195])
	for(i=[1:12]){
		rotate(a=[0, 0, i*30])
		translate([r*0.7, 0, 0])
		cube([r*0.2, r*0.2, h*0.81-r]);
	}
	}
	difference(){
		translate([0, 0, h-r]) 
		cylinder(r1=r, r2=r*0.9, h=r, $fn=30);
		translate([0, 0, h-r*0.5])
		cylinder(r=0.6*r, h=r*0.51, $fn=30);
	}
	}
}

module tower_r1(r, h){
	union(){
	difference(){
	cylinder(r=r, h=h-r*0.8, $fn=30);
	cylinder(r=r*0.9, h=h-r*0.7, $fn=30);
	}
	cylinder(r=r*0.65, h=h-r*0.3, $fn=30);
	cylinder(r=r*0.4, h=h, $fn=30);
	translate([0, 0, h-r*0.25])
	cylinder(r=r, h=r*0.075, $fn=30);
	translate([0, 0, h-r*0.25]){
	for(i=[1:24]){
		rotate([0, 0, i*15])
		translate([r*0.45, 0, 0])
		cube([r*0.55, r*0.075, r*0.2]);
	}
	}
	/*difference(){
	cylinder(r=r*0.8, h=h-r, $fn=30);
	translate([0, 0, h*0.195])
	for(i=[1:12]){
		rotate(a=[0, 0, i*30])
		translate([r*0.7, 0, 0])
		cube([r*0.2, r*0.2, h*0.81-r]);
	}
	}
	difference(){
		translate([0, 0, h-r]) 
		cylinder(r1=r, r2=r*0.9, h=r, $fn=30);
		translate([0, 0, h-r*0.5])
		cylinder(r=0.6*r, h=r*0.51, $fn=30);
	}*/
	}
}

translate([-20, 0, 0]) tower_s0(10, 15);
translate([0, 0, 0]) tower_s2(10, 15);
translate([20, 0, 0]) tower_s1(10, 15);
translate([0, 20, 0]) tower_r0(5, 15);
translate([20, 20, 0]) tower_r1(8, 20);
